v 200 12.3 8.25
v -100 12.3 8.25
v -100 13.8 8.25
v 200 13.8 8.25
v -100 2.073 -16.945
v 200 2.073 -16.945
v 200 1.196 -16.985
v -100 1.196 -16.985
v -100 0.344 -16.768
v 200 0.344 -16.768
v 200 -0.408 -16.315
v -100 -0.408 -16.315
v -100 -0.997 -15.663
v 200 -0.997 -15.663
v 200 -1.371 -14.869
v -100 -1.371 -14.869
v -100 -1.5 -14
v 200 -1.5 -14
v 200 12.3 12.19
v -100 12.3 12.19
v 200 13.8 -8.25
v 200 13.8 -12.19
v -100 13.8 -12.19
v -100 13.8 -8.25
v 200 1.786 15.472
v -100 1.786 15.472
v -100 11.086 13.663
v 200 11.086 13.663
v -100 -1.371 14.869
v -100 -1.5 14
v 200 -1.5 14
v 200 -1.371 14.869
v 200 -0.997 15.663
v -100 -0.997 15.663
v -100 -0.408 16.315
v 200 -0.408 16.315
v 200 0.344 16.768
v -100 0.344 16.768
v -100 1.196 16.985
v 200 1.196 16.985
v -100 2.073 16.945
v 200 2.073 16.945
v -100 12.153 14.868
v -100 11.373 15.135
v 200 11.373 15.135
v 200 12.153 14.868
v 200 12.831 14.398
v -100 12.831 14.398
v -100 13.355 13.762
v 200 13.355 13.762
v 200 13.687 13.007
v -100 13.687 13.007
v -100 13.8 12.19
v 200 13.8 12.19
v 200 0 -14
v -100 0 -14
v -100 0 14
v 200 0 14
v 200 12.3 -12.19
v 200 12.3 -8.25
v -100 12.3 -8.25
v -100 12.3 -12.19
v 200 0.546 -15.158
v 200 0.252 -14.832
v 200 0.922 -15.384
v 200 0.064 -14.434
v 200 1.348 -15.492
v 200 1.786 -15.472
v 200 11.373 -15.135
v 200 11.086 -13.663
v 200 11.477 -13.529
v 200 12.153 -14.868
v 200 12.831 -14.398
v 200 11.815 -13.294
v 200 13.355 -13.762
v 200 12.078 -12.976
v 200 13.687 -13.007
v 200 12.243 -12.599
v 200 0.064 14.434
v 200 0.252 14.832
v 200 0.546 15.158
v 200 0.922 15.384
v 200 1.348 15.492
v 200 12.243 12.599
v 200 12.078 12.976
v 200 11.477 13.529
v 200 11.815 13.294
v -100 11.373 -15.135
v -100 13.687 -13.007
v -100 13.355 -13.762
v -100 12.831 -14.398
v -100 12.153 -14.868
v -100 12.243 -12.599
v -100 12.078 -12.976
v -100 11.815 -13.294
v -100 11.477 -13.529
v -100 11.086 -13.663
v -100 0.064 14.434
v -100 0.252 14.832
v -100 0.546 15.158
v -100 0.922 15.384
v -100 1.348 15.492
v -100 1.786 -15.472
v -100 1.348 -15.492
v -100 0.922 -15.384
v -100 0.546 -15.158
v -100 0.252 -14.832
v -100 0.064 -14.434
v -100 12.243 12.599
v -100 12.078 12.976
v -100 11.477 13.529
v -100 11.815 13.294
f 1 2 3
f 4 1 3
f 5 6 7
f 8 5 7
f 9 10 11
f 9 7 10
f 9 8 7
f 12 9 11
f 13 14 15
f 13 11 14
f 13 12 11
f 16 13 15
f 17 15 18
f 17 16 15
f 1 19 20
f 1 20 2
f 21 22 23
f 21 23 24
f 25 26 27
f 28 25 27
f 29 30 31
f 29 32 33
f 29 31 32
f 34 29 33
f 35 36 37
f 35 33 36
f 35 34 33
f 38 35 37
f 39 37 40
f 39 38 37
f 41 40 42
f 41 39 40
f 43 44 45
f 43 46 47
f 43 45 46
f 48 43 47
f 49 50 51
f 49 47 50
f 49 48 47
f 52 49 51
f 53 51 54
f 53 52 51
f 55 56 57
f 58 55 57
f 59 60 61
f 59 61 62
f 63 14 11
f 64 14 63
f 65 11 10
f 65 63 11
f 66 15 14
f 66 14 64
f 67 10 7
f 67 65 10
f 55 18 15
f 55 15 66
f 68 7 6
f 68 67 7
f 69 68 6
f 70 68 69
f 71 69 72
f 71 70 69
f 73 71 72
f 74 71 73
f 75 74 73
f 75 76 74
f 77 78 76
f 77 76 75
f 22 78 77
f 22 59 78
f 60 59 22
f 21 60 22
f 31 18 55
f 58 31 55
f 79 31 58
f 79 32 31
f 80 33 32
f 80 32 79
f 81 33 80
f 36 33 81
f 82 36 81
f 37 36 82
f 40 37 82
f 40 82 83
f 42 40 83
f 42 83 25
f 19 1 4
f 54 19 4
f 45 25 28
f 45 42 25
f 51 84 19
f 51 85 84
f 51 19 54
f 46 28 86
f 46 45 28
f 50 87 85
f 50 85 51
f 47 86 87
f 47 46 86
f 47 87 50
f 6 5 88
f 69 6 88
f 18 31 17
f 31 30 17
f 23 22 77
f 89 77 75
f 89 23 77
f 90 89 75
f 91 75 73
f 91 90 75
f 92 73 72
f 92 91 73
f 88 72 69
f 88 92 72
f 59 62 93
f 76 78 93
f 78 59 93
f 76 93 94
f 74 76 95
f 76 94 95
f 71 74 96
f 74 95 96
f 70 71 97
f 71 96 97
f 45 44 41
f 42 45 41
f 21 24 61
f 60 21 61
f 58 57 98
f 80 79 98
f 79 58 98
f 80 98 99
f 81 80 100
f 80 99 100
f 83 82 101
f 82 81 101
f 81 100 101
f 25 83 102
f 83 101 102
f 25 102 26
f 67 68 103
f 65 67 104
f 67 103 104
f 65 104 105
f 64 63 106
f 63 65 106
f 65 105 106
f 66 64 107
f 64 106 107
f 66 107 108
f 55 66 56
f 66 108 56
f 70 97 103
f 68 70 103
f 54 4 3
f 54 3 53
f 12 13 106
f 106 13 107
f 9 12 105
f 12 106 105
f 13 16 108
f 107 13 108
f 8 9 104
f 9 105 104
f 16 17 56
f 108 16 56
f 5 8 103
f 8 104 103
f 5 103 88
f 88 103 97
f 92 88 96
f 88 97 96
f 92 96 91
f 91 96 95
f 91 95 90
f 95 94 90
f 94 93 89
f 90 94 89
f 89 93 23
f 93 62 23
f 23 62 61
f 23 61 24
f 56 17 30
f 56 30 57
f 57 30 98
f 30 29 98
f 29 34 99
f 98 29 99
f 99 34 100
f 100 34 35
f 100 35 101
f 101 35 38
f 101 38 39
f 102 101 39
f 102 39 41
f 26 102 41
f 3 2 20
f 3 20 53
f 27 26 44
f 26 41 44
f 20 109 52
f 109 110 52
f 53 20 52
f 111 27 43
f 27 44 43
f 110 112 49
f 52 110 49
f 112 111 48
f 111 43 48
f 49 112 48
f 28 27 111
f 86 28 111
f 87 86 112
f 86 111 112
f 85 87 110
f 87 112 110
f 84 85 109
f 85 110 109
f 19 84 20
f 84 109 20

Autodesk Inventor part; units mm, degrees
ref_plane "S1_XY" through (0, -1.5, 0) normal (-1, 0, 0) x (0, 0, -1)
ref_plane "S1_YZ" through (0, -1.5, 0) normal (0, 0, -1) x (0, -1, 0)
ref_plane "S1_ZX" through (0, -1.5, 0) normal (0, -1, 0) x (-1, 0, 0)
ref_plane "S2_XY" through (200, -1.5, 0) normal (1, 0, 0) x (0, 0, -1)
ref_plane "S2_YZ" through (200, -1.5, 0) normal (0, 0, -1) x (0, 1, 0)
ref_plane "S2_ZX" through (200, -1.5, 0) normal (0, 1, 0) x (1, 0, 0)
sketch "Sketch_1" plane through (0, 0, 0) normal (1, 0, 0) x (0, 1, 0)
  arc A0 (2.073, 16.9448) -> (-1.5, 14) centre (1.5, 14) ccw
  line L0 (-1.5, 14) -> (-1.5, -14)
  arc A1 (-1.5, -14) -> (2.073, -16.9448) centre (1.5, -14) ccw
  line L1 (2.073, -16.9448) -> (11.373, -15.1352)
  arc A2 (11.373, -15.1352) -> (13.8, -12.1904) centre (10.8, -12.1904) ccw
  line L2 (13.8, -12.1904) -> (13.8, -8.25)
  line L3 (13.8, -8.25) -> (12.3, -8.25)
  line L4 (12.3, -8.25) -> (12.3, -12.1904)
  arc A3 (11.0865, -13.6628) -> (12.3, -12.1904) centre (10.8, -12.1904) ccw
  line L5 (11.0865, -13.6628) -> (1.7865, -15.4724)
  arc A4 (0, -14) -> (1.7865, -15.4724) centre (1.5, -14) ccw
  line L6 (0, -14) -> (0, 14)
  arc A5 (1.7865, 15.4724) -> (0, 14) centre (1.5, 14) ccw
  line L7 (1.7865, 15.4724) -> (11.0865, 13.6628)
  arc A6 (12.3, 12.1904) -> (11.0865, 13.6628) centre (10.8, 12.1904) ccw
  line L8 (12.3, 12.1904) -> (12.3, 8.25)
  line L9 (12.3, 8.25) -> (13.8, 8.25)
  line L10 (13.8, 8.25) -> (13.8, 12.1904)
  arc A7 (13.8, 12.1904) -> (11.373, 15.1352) centre (10.8, 12.1904) ccw
  line L11 (11.373, 15.1352) -> (2.073, 16.9448)
extrude "Extrusion1" add sketch "Sketch_1" along normal blind 200 and the other way blind 100
sketch "Sketch2" plane through (-100, -1.5, -14) normal (0, -1, 0) x (1, 0, 0)
  circle A0 centre (26.56, 10.8287) radius 19.7262
  point P0 (100, 14)
sketch "草图3" plane through (200, -1.5, -14) normal (0, -1, 0) x (1, 0, 0)
  circle A0 centre (-27.2013, 14) radius 12.4918
  point P0 (-200, 14)
sketch "草图4" plane through (-100, 0, 0) normal (-1, 0, 0) x (0, 0, 1)
  circle A0 centre (11.9436, 5.123) radius 5.6638
  point P0 (0, 0)
properties part number "3932-200"
